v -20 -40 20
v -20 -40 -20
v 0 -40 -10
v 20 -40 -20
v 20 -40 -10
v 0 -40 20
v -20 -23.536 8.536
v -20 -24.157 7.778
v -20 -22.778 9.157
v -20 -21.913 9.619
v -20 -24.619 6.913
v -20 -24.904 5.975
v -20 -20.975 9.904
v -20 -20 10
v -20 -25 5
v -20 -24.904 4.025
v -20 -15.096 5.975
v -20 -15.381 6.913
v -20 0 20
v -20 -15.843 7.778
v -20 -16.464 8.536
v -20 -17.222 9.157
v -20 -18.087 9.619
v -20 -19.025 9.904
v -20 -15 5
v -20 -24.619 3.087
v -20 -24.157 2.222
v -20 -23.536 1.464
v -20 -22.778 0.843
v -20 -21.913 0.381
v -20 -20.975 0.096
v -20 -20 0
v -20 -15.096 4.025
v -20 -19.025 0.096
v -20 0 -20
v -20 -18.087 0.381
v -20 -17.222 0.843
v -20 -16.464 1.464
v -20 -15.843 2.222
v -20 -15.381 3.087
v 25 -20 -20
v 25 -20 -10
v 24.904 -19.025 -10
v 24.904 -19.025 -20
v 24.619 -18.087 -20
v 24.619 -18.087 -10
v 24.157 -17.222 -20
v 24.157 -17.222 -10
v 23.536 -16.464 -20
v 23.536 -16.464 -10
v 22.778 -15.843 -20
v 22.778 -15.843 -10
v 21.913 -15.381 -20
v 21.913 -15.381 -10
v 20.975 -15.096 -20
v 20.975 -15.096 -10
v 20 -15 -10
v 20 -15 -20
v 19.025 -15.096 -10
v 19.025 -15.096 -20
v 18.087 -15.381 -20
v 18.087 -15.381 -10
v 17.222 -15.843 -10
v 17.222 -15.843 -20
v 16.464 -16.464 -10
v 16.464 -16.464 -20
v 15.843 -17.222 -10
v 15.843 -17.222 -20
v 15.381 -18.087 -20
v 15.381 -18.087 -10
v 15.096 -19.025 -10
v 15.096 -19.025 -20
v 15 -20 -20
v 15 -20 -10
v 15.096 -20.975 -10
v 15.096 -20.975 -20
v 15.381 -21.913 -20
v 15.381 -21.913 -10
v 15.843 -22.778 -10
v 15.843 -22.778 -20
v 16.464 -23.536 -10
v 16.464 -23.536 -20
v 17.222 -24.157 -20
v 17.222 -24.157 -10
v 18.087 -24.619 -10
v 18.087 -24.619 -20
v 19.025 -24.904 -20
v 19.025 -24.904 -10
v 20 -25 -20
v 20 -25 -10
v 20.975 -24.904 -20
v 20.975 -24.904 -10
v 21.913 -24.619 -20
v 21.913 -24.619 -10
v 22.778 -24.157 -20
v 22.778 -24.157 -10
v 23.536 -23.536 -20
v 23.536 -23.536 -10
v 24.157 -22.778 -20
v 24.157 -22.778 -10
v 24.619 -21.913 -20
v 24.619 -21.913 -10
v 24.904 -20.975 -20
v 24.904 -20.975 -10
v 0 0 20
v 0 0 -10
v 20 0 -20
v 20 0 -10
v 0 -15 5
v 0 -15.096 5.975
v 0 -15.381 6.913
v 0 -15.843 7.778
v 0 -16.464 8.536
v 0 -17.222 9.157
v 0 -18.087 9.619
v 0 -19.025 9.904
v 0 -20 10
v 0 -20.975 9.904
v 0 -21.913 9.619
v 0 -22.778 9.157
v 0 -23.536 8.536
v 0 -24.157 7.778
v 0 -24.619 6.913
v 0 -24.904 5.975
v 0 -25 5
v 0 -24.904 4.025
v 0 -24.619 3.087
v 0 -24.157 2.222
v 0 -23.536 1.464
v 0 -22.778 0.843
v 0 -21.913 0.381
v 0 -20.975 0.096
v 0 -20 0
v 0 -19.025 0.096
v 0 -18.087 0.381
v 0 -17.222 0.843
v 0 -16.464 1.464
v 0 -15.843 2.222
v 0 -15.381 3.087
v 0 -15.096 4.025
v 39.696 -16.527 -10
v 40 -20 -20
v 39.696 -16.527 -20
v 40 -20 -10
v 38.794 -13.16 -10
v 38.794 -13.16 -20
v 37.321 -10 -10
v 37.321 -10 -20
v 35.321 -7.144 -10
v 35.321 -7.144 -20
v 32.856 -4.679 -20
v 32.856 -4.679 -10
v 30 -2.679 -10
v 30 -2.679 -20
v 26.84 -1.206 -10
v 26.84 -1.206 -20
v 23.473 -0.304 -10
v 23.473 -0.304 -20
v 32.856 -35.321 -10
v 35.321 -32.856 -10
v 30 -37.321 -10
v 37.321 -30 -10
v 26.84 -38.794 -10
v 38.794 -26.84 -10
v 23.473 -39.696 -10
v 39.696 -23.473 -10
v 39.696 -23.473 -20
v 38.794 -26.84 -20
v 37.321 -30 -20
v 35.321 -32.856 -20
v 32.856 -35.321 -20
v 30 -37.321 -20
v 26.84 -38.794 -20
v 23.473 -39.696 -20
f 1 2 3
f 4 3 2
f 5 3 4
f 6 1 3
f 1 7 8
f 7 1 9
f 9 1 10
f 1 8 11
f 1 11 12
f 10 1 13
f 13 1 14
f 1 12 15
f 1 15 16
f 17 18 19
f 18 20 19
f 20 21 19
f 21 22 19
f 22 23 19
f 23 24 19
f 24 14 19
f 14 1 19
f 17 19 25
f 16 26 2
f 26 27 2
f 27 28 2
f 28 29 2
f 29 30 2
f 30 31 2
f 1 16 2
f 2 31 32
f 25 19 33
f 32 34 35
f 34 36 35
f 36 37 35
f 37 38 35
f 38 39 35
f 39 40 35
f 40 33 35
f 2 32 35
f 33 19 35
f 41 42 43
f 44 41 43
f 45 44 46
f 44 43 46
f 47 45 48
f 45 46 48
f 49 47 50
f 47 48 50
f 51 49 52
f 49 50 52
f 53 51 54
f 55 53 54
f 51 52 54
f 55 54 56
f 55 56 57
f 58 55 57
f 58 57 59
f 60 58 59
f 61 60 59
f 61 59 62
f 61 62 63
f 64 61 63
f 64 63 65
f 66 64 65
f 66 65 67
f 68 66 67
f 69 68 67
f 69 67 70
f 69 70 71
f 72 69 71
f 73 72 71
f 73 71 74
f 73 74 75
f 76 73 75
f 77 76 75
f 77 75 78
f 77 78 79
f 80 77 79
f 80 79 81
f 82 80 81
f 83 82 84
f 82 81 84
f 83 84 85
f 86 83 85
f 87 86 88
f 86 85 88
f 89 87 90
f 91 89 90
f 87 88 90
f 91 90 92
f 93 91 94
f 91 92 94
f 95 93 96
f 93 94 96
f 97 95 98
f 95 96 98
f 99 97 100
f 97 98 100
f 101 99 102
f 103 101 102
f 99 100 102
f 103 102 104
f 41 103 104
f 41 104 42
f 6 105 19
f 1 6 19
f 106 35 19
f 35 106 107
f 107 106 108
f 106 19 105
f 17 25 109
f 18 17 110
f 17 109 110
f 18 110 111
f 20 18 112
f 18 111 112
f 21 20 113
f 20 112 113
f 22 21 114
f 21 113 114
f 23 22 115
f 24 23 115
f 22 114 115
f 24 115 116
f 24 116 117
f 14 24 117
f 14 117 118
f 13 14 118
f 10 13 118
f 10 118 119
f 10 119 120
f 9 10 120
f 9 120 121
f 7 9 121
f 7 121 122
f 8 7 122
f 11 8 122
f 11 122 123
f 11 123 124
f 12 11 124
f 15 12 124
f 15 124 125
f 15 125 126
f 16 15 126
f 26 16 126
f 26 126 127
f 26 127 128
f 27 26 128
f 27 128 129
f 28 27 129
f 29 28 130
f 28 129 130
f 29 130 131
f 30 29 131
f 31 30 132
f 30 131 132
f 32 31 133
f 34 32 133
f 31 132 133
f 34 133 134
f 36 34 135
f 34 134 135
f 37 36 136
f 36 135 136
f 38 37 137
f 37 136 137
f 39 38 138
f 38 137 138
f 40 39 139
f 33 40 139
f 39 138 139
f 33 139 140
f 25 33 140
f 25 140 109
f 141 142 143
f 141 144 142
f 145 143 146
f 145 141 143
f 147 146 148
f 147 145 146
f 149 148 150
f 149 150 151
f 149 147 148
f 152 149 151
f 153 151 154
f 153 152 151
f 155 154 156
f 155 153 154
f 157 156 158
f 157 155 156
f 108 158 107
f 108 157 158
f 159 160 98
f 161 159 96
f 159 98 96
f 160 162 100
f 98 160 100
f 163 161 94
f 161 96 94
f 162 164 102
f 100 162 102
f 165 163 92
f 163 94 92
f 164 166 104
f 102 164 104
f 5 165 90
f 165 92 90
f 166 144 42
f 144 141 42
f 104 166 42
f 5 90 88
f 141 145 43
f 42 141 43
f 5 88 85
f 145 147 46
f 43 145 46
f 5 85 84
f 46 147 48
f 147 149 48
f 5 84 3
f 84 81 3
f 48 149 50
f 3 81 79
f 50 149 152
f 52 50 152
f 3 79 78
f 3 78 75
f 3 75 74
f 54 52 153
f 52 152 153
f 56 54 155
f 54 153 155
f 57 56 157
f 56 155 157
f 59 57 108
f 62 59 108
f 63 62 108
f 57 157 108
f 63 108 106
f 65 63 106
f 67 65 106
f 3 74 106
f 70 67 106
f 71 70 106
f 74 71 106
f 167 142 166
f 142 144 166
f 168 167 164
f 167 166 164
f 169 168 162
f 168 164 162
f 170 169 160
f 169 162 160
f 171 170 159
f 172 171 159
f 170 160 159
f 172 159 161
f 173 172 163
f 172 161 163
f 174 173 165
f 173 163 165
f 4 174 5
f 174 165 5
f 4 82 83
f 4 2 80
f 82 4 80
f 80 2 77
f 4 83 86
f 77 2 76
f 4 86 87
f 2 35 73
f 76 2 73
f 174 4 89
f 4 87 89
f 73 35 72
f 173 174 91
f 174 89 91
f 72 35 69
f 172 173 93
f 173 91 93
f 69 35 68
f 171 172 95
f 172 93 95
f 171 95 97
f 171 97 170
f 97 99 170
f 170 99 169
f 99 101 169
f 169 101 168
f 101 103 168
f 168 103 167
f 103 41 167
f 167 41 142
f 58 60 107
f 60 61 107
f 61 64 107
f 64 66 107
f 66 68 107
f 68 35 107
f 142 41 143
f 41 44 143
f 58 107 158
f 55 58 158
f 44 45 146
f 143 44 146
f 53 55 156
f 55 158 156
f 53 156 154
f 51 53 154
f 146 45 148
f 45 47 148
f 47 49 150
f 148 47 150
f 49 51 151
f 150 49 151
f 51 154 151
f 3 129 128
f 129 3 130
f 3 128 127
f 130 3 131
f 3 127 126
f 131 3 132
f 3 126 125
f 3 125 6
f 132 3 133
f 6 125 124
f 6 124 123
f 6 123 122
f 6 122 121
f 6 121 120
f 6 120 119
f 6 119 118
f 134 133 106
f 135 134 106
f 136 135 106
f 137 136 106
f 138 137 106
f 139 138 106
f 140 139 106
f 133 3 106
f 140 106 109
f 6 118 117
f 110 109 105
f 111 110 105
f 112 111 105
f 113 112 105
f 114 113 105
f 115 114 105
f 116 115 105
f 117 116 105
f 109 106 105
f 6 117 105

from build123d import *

# Parameters (mm, degrees)
F1_DEPTH = 40
F2_R     = 19.99999
F3_R     = 5
F4_DEPTH = 25
F5_R     = 5
F6_DEPTH = 25


# Not quite as in the source:
# - a fillet or chamfer is up to 0.001 mm smaller than in the source, because OpenCascade refuses the exact size


with BuildPart() as f1:
    # F0 (on Front) → F1 (new body)
    with BuildSketch(Plane.XZ):
        Polygon((0, -10), (0, 0), (0, 20), (-20, 20), (-20, -20), (0, -20), (40, -20), (40, -10), align=None)
    extrude(amount=F1_DEPTH)

    # F2 (radius 20 in the source; OpenCascade refuses exactly that, so slightly less here)
    f2_edges = [f1.edges().sort_by_distance(p)[0] for p in [
        (40, -40, -15),
        (40, 0, -15),
    ]]
    fillet(f2_edges, radius=F2_R)

    # F3 (on face) → F4 (cut)
    with BuildSketch(Plane.XY.offset(-10)):
        with Locations((20, -20)):
            Circle(F3_R)
    extrude(amount=-F4_DEPTH, mode=Mode.SUBTRACT)

    # F5 (on face) → F6 (cut)
    with BuildSketch(Plane.YZ):
        with Locations((-20, 5)):
            Circle(F5_R)
    extrude(amount=-F6_DEPTH, mode=Mode.SUBTRACT)


solid = f1.part
